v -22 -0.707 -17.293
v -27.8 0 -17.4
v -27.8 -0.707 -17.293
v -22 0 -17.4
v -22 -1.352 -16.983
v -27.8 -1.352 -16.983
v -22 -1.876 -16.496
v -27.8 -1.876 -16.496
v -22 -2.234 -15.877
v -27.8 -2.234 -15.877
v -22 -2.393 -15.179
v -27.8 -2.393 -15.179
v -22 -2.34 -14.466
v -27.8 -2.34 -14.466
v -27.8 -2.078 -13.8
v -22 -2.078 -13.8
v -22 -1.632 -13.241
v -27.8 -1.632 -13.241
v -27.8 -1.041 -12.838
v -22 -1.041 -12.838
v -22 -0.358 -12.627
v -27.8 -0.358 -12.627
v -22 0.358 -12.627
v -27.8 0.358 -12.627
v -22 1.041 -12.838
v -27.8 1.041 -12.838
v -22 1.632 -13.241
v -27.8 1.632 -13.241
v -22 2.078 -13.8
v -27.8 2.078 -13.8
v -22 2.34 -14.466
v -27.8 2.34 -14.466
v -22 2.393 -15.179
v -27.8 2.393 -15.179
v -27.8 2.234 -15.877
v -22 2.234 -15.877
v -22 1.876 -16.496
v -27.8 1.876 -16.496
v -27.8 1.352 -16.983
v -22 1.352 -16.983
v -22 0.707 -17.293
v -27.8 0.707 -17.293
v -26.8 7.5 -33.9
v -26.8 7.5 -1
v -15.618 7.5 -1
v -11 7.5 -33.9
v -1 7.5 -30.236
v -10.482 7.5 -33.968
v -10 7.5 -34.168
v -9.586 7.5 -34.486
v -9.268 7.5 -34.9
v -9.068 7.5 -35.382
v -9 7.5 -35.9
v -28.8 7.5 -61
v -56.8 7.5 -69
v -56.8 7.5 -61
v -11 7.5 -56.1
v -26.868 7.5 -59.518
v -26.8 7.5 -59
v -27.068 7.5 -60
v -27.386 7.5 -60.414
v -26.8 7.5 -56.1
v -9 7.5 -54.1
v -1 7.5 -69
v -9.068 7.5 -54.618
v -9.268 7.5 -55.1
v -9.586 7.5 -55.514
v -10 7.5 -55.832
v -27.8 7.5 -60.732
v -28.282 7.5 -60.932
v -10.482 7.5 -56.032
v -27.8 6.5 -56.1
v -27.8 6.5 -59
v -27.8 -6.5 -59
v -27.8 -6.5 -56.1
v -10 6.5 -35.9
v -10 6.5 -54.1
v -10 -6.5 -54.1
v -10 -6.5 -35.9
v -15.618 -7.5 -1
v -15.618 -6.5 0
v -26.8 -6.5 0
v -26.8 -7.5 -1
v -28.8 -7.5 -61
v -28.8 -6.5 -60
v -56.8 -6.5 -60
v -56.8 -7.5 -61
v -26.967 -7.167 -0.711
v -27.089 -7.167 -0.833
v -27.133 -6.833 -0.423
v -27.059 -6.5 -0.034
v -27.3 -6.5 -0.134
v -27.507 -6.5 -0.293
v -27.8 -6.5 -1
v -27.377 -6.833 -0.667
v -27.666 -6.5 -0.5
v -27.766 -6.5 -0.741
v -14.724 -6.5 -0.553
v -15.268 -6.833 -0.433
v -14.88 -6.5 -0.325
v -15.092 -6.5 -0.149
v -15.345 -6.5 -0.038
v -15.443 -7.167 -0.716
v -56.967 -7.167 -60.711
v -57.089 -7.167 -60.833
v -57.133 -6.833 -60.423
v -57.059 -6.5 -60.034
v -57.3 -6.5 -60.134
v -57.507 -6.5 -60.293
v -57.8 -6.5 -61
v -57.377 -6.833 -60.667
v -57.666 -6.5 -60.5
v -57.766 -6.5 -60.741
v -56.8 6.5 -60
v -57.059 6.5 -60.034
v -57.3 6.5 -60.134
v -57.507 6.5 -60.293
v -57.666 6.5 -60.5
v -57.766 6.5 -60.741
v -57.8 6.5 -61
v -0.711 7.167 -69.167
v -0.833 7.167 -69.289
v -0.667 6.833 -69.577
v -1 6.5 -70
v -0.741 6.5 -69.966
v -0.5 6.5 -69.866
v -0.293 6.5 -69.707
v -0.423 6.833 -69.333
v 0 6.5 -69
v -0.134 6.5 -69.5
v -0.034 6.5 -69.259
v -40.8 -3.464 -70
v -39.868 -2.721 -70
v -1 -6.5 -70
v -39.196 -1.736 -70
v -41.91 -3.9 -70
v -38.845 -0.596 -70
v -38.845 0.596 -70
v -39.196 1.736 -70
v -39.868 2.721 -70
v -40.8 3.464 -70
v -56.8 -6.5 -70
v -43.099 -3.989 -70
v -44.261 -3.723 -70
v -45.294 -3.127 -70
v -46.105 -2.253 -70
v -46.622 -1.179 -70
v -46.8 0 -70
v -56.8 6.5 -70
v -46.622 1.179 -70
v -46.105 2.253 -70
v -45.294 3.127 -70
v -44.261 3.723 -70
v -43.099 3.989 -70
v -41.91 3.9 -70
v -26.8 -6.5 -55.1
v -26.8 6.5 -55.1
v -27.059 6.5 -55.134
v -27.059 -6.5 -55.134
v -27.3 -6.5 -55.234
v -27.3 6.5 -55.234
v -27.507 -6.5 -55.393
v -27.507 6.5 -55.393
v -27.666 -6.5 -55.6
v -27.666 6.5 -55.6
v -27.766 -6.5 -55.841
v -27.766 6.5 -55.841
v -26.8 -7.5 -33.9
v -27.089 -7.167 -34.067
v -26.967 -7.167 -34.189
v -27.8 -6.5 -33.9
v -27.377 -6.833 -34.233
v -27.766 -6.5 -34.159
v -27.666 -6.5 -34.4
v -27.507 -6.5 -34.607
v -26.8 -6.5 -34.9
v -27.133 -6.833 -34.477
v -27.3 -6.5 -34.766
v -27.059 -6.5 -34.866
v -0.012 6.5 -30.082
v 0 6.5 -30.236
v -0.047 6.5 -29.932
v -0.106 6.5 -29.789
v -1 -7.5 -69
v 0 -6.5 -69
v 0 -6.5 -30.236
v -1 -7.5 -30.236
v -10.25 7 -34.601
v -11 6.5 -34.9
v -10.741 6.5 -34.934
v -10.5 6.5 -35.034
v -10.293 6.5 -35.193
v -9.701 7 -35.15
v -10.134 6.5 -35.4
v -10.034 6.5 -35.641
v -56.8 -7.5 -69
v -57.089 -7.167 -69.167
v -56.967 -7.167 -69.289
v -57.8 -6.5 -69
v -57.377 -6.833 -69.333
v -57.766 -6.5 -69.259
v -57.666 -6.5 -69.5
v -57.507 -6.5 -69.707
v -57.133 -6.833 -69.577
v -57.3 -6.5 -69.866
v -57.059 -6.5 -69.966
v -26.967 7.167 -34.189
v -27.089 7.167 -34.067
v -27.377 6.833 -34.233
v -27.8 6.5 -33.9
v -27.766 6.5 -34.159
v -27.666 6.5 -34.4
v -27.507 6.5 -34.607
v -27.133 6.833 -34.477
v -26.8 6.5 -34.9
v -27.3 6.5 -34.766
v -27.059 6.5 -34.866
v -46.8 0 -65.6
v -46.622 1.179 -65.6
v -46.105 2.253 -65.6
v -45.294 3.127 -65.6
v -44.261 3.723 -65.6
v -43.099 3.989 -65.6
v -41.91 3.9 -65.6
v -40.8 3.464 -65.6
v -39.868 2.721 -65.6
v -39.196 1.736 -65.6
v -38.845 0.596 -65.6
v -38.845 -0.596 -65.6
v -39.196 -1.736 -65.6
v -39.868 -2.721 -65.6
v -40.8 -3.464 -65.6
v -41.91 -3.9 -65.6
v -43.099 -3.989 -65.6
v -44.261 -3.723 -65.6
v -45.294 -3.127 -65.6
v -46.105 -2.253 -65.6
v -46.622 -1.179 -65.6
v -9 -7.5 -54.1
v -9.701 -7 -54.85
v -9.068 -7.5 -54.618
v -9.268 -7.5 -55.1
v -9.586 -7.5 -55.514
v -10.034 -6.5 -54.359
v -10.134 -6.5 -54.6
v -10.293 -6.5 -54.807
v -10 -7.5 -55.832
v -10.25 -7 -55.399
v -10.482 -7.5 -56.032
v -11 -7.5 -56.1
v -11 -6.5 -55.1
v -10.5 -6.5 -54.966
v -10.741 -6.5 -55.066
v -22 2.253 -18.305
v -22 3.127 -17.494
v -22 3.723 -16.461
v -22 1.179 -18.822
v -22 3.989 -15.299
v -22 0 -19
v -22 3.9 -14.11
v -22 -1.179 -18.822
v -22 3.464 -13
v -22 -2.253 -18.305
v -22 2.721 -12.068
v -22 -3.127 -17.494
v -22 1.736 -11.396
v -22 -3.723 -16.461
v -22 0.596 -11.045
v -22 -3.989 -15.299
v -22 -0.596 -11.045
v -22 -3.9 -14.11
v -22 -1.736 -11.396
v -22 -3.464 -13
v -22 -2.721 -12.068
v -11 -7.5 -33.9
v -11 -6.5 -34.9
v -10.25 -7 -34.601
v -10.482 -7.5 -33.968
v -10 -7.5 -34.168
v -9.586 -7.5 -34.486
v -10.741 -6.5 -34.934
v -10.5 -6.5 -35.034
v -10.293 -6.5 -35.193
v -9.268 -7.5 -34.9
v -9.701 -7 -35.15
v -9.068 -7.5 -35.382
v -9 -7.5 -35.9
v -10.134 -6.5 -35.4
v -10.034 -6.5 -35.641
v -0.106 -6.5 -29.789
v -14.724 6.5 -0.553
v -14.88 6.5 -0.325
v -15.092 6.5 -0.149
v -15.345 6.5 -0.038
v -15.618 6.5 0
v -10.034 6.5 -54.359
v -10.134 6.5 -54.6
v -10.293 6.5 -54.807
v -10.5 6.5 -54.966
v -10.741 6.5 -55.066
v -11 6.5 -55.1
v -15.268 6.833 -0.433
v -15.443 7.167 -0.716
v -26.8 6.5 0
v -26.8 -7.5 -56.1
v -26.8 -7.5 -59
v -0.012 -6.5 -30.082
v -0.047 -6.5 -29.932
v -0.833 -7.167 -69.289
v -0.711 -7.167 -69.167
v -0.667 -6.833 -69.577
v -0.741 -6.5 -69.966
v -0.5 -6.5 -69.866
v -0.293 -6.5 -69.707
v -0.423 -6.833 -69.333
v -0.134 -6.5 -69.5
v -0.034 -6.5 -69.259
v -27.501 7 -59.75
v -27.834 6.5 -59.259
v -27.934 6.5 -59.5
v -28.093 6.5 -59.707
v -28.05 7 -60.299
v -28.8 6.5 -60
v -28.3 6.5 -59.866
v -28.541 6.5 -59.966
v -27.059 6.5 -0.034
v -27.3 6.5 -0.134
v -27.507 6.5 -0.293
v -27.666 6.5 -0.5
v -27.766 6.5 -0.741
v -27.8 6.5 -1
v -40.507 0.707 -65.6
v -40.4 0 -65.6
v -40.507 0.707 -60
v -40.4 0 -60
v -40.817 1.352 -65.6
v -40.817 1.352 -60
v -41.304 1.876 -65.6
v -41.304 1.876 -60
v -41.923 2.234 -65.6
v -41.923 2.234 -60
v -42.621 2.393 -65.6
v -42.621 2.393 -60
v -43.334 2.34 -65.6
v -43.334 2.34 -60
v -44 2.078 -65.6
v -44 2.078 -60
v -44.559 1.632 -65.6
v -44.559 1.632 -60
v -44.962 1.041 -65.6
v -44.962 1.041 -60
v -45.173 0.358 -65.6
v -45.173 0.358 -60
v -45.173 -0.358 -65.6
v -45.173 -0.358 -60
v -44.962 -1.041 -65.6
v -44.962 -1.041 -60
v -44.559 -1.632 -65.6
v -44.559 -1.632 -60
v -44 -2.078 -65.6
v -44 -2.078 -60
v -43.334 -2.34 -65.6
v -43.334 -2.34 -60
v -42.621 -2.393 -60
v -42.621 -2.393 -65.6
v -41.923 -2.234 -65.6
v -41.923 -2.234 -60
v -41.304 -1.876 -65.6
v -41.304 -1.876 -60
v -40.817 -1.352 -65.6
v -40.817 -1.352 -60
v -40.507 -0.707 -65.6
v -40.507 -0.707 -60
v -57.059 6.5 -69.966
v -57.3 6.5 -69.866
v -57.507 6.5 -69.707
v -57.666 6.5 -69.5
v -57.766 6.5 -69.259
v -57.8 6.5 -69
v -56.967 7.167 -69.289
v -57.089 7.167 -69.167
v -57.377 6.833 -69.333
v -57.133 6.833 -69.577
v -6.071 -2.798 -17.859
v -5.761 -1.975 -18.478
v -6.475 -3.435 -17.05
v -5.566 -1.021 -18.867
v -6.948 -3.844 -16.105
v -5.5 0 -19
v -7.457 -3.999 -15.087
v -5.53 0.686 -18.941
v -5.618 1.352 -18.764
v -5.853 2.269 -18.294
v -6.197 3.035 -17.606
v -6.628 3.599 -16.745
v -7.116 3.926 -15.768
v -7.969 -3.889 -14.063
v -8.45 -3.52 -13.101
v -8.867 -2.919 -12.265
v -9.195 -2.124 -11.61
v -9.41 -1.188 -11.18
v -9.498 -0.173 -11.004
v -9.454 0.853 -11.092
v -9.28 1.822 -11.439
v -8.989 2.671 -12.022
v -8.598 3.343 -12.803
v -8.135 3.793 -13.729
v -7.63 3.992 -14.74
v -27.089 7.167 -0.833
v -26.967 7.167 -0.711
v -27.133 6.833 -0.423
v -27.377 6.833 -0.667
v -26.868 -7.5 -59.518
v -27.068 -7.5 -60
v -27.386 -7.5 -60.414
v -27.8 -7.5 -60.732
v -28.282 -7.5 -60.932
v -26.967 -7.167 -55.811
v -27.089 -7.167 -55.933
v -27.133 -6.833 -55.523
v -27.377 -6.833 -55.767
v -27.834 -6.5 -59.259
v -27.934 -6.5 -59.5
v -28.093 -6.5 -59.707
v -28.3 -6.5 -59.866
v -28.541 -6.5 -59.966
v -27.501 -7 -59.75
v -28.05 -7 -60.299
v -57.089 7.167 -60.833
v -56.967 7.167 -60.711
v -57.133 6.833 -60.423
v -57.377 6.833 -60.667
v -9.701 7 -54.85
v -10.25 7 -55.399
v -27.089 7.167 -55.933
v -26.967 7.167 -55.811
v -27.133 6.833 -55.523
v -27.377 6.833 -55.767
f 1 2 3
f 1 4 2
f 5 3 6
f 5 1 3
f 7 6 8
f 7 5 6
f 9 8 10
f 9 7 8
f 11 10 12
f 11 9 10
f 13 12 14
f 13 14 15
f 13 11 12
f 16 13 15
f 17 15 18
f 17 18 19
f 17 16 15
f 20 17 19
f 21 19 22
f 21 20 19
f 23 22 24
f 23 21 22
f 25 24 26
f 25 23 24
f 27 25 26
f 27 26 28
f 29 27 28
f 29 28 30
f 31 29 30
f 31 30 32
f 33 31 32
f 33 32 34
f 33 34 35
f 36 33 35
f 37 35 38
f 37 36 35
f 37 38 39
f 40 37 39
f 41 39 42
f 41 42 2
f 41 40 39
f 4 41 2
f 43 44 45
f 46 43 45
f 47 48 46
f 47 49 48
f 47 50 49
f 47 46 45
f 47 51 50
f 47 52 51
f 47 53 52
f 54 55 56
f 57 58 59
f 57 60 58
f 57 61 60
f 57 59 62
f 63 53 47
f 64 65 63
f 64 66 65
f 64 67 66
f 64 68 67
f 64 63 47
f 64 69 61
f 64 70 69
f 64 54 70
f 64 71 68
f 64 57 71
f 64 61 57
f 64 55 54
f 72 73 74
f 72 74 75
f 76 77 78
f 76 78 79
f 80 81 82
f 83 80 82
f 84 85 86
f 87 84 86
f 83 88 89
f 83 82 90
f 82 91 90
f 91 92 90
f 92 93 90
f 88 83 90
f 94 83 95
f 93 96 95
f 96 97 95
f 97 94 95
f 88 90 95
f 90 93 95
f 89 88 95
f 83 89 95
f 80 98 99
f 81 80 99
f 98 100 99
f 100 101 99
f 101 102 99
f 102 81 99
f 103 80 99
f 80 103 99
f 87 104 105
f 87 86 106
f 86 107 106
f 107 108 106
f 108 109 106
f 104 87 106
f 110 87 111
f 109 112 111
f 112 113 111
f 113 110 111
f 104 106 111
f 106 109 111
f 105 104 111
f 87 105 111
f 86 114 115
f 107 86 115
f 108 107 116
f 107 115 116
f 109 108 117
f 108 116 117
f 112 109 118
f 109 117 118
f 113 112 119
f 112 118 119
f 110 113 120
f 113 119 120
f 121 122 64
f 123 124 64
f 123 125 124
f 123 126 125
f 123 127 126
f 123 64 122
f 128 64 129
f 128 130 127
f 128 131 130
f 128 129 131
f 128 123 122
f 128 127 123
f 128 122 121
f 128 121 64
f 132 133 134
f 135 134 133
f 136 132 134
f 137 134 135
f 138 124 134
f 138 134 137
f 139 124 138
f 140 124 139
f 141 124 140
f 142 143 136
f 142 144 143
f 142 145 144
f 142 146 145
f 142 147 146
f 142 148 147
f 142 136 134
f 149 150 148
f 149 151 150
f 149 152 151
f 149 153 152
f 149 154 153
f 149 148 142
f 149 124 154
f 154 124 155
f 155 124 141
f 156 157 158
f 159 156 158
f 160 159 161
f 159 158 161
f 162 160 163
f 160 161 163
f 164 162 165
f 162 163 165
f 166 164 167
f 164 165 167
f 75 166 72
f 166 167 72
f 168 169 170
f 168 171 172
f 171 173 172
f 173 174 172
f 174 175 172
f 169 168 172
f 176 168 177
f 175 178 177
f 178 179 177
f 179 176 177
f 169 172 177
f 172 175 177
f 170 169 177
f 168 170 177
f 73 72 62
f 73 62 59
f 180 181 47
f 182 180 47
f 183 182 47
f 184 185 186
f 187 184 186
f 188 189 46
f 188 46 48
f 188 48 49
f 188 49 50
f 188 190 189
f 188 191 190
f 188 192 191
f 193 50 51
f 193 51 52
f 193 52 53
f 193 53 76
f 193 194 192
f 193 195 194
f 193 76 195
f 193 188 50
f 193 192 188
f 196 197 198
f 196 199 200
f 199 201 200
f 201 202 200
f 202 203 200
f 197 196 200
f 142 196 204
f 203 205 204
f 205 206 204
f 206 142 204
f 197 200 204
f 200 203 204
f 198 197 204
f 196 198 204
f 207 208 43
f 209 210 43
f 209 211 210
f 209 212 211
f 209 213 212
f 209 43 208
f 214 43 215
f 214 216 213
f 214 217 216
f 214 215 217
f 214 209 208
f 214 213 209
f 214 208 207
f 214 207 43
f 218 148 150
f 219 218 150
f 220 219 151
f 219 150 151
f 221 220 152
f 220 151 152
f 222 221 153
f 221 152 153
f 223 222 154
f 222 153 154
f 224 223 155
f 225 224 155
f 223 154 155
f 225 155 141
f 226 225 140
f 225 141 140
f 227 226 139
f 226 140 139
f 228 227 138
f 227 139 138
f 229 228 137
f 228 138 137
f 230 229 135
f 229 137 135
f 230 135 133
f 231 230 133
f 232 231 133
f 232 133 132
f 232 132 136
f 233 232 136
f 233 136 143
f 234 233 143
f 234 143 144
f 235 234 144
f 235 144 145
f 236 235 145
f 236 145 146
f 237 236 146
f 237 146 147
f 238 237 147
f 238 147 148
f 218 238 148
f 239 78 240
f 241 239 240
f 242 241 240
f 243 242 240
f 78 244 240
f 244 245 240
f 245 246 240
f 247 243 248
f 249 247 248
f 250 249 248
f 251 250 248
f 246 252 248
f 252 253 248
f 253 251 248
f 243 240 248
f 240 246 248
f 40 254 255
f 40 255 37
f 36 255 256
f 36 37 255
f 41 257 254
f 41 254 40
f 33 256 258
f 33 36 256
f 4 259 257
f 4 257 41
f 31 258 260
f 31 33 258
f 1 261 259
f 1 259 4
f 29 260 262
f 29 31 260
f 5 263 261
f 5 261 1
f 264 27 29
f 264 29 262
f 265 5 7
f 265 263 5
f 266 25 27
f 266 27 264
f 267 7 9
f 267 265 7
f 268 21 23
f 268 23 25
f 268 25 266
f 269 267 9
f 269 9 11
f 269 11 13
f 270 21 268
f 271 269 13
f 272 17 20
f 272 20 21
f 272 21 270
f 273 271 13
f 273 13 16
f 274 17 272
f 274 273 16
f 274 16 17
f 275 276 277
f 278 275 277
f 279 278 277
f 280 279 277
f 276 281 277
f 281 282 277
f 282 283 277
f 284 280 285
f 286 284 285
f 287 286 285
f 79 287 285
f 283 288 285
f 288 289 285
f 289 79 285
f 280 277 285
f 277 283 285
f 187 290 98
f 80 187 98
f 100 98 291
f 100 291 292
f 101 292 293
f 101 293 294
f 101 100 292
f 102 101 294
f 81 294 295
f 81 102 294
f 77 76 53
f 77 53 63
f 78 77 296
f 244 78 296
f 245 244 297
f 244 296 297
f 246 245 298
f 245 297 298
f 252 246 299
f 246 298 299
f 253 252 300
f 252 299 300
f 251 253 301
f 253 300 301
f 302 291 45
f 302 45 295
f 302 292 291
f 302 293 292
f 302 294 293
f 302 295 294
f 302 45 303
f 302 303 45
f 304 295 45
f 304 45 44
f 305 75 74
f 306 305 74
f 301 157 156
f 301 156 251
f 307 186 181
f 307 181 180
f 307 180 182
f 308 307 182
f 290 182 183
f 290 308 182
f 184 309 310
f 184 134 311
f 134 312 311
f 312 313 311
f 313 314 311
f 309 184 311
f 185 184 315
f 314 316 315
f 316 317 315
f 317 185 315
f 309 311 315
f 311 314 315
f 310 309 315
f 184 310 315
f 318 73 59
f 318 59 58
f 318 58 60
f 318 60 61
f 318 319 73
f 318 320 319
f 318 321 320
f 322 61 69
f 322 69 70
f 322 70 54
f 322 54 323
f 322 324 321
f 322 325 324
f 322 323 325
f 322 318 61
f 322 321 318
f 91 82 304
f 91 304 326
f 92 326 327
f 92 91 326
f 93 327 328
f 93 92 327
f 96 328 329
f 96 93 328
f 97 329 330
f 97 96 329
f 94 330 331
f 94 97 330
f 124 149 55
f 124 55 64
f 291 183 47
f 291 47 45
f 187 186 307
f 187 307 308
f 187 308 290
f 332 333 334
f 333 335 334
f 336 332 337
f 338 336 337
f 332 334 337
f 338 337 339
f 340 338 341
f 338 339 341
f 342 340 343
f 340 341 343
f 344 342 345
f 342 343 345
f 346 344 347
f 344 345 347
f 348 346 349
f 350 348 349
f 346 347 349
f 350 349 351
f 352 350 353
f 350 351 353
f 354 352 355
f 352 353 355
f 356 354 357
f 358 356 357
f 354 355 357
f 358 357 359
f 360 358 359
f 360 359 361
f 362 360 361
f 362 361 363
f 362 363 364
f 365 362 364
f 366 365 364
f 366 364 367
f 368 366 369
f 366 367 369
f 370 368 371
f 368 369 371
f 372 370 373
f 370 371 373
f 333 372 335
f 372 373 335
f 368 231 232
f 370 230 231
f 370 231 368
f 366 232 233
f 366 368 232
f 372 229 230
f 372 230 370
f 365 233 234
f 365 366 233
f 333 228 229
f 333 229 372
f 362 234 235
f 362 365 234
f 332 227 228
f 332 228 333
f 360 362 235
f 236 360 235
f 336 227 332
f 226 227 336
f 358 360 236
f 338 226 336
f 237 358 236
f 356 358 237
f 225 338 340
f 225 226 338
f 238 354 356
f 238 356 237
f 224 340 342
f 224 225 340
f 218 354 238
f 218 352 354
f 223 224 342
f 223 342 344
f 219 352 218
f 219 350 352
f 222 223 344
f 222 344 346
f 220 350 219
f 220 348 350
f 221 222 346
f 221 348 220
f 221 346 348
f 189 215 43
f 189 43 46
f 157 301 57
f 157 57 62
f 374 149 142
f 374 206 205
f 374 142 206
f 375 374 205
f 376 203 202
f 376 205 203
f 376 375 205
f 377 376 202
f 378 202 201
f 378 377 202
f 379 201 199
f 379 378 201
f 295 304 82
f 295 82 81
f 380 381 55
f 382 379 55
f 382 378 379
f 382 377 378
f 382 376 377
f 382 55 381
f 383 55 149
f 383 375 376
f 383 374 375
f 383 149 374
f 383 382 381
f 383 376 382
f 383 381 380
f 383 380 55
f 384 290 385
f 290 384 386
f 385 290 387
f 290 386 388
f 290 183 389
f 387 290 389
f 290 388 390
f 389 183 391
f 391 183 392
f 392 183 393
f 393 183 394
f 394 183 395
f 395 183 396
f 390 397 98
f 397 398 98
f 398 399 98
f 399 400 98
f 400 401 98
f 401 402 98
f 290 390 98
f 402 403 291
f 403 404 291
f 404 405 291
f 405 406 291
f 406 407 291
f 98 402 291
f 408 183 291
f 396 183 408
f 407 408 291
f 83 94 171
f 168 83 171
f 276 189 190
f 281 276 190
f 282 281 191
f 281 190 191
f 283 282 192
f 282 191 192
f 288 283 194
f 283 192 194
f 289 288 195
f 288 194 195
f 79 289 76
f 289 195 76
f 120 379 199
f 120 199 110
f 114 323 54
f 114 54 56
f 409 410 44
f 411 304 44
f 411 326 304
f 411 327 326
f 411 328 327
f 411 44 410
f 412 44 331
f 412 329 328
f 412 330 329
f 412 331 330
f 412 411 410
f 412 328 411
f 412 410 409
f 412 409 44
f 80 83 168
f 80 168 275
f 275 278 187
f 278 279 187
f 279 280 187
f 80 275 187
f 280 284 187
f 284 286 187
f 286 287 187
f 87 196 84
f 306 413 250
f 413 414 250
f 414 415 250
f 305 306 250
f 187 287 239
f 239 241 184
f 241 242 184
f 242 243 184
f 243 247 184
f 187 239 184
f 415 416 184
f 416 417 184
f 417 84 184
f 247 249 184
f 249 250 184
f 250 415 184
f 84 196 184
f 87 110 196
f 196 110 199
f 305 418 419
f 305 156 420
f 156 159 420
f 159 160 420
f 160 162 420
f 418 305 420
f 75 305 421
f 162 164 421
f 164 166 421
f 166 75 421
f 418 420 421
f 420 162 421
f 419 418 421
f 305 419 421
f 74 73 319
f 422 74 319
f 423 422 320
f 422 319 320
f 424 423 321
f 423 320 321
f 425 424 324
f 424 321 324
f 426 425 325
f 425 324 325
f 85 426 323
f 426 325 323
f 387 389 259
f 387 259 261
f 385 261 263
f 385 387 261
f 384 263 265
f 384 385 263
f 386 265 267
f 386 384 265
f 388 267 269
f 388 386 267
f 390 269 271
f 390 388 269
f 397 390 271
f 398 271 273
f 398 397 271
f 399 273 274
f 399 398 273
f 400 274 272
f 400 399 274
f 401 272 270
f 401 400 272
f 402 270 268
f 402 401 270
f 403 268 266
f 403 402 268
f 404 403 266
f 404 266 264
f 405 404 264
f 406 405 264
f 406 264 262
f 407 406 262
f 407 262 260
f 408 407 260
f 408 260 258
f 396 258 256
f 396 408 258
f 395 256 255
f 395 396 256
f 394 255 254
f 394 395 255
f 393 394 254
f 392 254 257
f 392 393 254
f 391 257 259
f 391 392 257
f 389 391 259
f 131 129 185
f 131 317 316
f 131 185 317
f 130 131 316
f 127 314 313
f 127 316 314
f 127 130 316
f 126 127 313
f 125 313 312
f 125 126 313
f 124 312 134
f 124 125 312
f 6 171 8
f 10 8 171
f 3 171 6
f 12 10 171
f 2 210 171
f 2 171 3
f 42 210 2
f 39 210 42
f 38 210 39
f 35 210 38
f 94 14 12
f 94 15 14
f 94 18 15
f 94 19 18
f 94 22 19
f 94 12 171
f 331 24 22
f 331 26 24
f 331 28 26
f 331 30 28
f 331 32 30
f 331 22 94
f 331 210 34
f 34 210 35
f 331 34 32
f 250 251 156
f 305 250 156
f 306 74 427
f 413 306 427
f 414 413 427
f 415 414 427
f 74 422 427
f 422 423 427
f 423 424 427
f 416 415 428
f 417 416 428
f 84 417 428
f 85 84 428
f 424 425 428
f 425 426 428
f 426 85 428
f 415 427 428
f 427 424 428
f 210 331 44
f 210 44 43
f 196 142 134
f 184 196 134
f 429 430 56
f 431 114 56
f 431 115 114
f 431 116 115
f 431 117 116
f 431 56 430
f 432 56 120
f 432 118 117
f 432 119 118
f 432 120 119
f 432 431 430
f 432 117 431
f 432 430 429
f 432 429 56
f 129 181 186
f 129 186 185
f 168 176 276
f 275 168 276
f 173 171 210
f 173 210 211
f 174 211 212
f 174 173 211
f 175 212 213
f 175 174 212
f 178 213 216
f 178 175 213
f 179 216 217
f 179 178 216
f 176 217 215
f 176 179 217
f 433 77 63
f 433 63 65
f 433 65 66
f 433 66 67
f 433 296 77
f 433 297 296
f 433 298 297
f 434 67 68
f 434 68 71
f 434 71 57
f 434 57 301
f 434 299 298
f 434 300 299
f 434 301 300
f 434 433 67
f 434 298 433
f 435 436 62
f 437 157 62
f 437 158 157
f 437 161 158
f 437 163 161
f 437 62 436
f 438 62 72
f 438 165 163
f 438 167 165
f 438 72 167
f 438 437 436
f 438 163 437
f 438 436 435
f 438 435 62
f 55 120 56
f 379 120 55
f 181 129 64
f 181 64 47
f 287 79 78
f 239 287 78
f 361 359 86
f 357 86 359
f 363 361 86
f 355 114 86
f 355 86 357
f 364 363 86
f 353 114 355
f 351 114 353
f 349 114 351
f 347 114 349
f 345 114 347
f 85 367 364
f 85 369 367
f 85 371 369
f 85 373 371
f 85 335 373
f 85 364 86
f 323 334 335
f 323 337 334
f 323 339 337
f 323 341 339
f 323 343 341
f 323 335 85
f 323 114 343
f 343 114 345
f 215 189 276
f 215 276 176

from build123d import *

# Parameters (mm, degrees)
BOSS_EXTRUDE1_DEPTH                                 = 7.5
CBORE_FOR_M4_HEX_SOCKET_HEAD_CAP_SCREW2_D           = 4.8
CBORE_FOR_M4_HEX_SOCKET_HEAD_CAP_SCREW2_CBORE_D     = 8
CBORE_FOR_M4_HEX_SOCKET_HEAD_CAP_SCREW2_CBORE_DEPTH = 4.4
CHAMFER1_SIZE                                       = 30
CHAMFER1_SIZE_2                                     = 15
FILLET1_R                                           = 1
CHAMFER2_SIZE                                       = 1


# Some blends are built 0.0001 mm under size
with BuildPart() as part:
    # Sketch2 → Boss-Extrude1 (new, symmetric)
    with BuildSketch(Plane(origin=(0, 0, 0), x_dir=(1, 0, 0), z_dir=(0, 1, 0))):
        Polygon((0, 0), (0, 70), (-57.8, 70), (-57.8, 60), (-27.8, 60), (-27.8, 55.1), (-10, 55.1), (-10, 34.9), (-27.8, 34.9), (-27.8, 0), align=None)
    extrude(amount=BOSS_EXTRUDE1_DEPTH, both=True)

    # Sketch4 → CBORE for M4 Hex Socket Head Cap Screw1 (revolve, cut)
    with BuildSketch(Plane(origin=(0, 0, -15), x_dir=(0, 0, -1), z_dir=(0, 1, 0))):
        Polygon((0, 0), (0, 27.8), (2.4, 27.8), (2.4, 22), (4, 22), (4, 0.025), (4.025, 0), align=None)
    revolve(axis=Axis((6.35, 0, -15), (-1, 0, 0)), mode=Mode.SUBTRACT)

    # CBORE for M4 Hex Socket Head Cap Screw2 (through all)
    with Locations(Plane(origin=(0, 0, -70), x_dir=(-1, 0, 0), z_dir=(0, 0, -1))):
        with Locations((42.8, 0)):
            CounterBoreHole(CBORE_FOR_M4_HEX_SOCKET_HEAD_CAP_SCREW2_D / 2, CBORE_FOR_M4_HEX_SOCKET_HEAD_CAP_SCREW2_CBORE_D / 2, CBORE_FOR_M4_HEX_SOCKET_HEAD_CAP_SCREW2_CBORE_DEPTH)

    # Chamfer1
    # the kernel refuses this chamfer: 30, 15 mm, written as the material it takes off along each edge
    with BuildSketch(Plane(origin=(0, 85.194866214, 0), x_dir=(0.01726807512366813, 0, -0.9998508956747117), z_dir=(0, -1, 0))) as chamfer1_piece_1:
        Polygon((CHAMFER1_SIZE * 0.999850895675, -CHAMFER1_SIZE * 0.0172680751237), (-CHAMFER1_SIZE_2 * 0.0172680751237, -CHAMFER1_SIZE_2 * 0.999850895675), (0, 0), align=None)
    extrude(amount=170.389732427, mode=Mode.SUBTRACT)

    # Fillet1
    fillet1_edges = [part.edges().sort_by_distance(p)[0] for p in [
        (0, 0, -70),
        (-27.8, 0, 0),
        (-27.8, 0, -34.9),
        (-10, 0, -34.9),
        (-10, 0, -55.1),
        (-27.8, 0, -55.1),
        (-27.8, 0, -60),
        (-57.8, 0, -60),
        (-57.8, 0, -70),
        (0, 0, -30),
        (-15, 0, 0),
    ]]
    fillet(fillet1_edges, radius=FILLET1_R)

    # Chamfer2
    chamfer2_edges = [part.edges().sort_by_distance(p)[0] for p in [
        (-28.092893219, -7.5, -59.707106781),
        (-28.092893219, 7.5, -59.707106781),
        (-10.292893219, -7.5, -35.192893219),
        (-10.292893219, 7.5, -35.192893219),
        (-10.292893219, -7.5, -54.807106781),
        (-10.292893219, 7.5, -54.807106781),
        (-27.8, -7.5, -57.55),
        (-27.8, 7.5, -57.55),
        (-42.8, -7.5, -60),
        (-42.8, 7.5, -60),
        (-18.9, -7.5, -34.9),
        (-18.9, 7.5, -34.9),
        (-10, -7.5, -45),
        (-10, 7.5, -45),
        (-18.9, -7.5, -55.1),
        (-18.9, 7.5, -55.1),
        (-57.8, -7.5, -65),
        (-57.8, 7.5, -65),
        (0, -7.5, -49.618033989),
        (-7.414589803, -7.5, -15.170820393),
        (-21.209016994, -7.5, 0),
        (-27.8, -7.5, -17.45),
        (-28.9, -7.5, -70),
        (-27.507106781, -7.5, -55.392893219),
        (-27.507106781, -7.5, -34.607106781),
        (-57.507106781, -7.5, -60.292893219),
        (-27.507106781, -7.5, -0.292893219),
        (-15.092302877, -7.5, -0.149349192),
        (-0.026751011, -7.5, -30.006315057),
        (-0.292893219, -7.5, -69.707106781),
        (-57.507106781, -7.5, -69.707106781),
        (-28.9, 7.5, -70),
        (-21.209016994, 7.5, 0),
        (-7.414589803, 7.5, -15.170820393),
        (0, 7.5, -49.618033989),
        (-27.8, 7.5, -17.45),
        (-27.507106781, 7.5, -55.392893219),
        (-27.507106781, 7.5, -34.607106781),
        (-57.507106781, 7.5, -60.292893219),
        (-27.507106781, 7.5, -0.292893219),
        (-15.092302877, 7.5, -0.149349192),
        (-0.026751011, 7.5, -30.006315057),
        (-0.292893219, 7.5, -69.707106781),
        (-57.507106781, 7.5, -69.707106781),
    ]]
    chamfer(chamfer2_edges, length=CHAMFER2_SIZE - 0.0001)  # a hair under: the kernel refuses the full size


solid = part.part
